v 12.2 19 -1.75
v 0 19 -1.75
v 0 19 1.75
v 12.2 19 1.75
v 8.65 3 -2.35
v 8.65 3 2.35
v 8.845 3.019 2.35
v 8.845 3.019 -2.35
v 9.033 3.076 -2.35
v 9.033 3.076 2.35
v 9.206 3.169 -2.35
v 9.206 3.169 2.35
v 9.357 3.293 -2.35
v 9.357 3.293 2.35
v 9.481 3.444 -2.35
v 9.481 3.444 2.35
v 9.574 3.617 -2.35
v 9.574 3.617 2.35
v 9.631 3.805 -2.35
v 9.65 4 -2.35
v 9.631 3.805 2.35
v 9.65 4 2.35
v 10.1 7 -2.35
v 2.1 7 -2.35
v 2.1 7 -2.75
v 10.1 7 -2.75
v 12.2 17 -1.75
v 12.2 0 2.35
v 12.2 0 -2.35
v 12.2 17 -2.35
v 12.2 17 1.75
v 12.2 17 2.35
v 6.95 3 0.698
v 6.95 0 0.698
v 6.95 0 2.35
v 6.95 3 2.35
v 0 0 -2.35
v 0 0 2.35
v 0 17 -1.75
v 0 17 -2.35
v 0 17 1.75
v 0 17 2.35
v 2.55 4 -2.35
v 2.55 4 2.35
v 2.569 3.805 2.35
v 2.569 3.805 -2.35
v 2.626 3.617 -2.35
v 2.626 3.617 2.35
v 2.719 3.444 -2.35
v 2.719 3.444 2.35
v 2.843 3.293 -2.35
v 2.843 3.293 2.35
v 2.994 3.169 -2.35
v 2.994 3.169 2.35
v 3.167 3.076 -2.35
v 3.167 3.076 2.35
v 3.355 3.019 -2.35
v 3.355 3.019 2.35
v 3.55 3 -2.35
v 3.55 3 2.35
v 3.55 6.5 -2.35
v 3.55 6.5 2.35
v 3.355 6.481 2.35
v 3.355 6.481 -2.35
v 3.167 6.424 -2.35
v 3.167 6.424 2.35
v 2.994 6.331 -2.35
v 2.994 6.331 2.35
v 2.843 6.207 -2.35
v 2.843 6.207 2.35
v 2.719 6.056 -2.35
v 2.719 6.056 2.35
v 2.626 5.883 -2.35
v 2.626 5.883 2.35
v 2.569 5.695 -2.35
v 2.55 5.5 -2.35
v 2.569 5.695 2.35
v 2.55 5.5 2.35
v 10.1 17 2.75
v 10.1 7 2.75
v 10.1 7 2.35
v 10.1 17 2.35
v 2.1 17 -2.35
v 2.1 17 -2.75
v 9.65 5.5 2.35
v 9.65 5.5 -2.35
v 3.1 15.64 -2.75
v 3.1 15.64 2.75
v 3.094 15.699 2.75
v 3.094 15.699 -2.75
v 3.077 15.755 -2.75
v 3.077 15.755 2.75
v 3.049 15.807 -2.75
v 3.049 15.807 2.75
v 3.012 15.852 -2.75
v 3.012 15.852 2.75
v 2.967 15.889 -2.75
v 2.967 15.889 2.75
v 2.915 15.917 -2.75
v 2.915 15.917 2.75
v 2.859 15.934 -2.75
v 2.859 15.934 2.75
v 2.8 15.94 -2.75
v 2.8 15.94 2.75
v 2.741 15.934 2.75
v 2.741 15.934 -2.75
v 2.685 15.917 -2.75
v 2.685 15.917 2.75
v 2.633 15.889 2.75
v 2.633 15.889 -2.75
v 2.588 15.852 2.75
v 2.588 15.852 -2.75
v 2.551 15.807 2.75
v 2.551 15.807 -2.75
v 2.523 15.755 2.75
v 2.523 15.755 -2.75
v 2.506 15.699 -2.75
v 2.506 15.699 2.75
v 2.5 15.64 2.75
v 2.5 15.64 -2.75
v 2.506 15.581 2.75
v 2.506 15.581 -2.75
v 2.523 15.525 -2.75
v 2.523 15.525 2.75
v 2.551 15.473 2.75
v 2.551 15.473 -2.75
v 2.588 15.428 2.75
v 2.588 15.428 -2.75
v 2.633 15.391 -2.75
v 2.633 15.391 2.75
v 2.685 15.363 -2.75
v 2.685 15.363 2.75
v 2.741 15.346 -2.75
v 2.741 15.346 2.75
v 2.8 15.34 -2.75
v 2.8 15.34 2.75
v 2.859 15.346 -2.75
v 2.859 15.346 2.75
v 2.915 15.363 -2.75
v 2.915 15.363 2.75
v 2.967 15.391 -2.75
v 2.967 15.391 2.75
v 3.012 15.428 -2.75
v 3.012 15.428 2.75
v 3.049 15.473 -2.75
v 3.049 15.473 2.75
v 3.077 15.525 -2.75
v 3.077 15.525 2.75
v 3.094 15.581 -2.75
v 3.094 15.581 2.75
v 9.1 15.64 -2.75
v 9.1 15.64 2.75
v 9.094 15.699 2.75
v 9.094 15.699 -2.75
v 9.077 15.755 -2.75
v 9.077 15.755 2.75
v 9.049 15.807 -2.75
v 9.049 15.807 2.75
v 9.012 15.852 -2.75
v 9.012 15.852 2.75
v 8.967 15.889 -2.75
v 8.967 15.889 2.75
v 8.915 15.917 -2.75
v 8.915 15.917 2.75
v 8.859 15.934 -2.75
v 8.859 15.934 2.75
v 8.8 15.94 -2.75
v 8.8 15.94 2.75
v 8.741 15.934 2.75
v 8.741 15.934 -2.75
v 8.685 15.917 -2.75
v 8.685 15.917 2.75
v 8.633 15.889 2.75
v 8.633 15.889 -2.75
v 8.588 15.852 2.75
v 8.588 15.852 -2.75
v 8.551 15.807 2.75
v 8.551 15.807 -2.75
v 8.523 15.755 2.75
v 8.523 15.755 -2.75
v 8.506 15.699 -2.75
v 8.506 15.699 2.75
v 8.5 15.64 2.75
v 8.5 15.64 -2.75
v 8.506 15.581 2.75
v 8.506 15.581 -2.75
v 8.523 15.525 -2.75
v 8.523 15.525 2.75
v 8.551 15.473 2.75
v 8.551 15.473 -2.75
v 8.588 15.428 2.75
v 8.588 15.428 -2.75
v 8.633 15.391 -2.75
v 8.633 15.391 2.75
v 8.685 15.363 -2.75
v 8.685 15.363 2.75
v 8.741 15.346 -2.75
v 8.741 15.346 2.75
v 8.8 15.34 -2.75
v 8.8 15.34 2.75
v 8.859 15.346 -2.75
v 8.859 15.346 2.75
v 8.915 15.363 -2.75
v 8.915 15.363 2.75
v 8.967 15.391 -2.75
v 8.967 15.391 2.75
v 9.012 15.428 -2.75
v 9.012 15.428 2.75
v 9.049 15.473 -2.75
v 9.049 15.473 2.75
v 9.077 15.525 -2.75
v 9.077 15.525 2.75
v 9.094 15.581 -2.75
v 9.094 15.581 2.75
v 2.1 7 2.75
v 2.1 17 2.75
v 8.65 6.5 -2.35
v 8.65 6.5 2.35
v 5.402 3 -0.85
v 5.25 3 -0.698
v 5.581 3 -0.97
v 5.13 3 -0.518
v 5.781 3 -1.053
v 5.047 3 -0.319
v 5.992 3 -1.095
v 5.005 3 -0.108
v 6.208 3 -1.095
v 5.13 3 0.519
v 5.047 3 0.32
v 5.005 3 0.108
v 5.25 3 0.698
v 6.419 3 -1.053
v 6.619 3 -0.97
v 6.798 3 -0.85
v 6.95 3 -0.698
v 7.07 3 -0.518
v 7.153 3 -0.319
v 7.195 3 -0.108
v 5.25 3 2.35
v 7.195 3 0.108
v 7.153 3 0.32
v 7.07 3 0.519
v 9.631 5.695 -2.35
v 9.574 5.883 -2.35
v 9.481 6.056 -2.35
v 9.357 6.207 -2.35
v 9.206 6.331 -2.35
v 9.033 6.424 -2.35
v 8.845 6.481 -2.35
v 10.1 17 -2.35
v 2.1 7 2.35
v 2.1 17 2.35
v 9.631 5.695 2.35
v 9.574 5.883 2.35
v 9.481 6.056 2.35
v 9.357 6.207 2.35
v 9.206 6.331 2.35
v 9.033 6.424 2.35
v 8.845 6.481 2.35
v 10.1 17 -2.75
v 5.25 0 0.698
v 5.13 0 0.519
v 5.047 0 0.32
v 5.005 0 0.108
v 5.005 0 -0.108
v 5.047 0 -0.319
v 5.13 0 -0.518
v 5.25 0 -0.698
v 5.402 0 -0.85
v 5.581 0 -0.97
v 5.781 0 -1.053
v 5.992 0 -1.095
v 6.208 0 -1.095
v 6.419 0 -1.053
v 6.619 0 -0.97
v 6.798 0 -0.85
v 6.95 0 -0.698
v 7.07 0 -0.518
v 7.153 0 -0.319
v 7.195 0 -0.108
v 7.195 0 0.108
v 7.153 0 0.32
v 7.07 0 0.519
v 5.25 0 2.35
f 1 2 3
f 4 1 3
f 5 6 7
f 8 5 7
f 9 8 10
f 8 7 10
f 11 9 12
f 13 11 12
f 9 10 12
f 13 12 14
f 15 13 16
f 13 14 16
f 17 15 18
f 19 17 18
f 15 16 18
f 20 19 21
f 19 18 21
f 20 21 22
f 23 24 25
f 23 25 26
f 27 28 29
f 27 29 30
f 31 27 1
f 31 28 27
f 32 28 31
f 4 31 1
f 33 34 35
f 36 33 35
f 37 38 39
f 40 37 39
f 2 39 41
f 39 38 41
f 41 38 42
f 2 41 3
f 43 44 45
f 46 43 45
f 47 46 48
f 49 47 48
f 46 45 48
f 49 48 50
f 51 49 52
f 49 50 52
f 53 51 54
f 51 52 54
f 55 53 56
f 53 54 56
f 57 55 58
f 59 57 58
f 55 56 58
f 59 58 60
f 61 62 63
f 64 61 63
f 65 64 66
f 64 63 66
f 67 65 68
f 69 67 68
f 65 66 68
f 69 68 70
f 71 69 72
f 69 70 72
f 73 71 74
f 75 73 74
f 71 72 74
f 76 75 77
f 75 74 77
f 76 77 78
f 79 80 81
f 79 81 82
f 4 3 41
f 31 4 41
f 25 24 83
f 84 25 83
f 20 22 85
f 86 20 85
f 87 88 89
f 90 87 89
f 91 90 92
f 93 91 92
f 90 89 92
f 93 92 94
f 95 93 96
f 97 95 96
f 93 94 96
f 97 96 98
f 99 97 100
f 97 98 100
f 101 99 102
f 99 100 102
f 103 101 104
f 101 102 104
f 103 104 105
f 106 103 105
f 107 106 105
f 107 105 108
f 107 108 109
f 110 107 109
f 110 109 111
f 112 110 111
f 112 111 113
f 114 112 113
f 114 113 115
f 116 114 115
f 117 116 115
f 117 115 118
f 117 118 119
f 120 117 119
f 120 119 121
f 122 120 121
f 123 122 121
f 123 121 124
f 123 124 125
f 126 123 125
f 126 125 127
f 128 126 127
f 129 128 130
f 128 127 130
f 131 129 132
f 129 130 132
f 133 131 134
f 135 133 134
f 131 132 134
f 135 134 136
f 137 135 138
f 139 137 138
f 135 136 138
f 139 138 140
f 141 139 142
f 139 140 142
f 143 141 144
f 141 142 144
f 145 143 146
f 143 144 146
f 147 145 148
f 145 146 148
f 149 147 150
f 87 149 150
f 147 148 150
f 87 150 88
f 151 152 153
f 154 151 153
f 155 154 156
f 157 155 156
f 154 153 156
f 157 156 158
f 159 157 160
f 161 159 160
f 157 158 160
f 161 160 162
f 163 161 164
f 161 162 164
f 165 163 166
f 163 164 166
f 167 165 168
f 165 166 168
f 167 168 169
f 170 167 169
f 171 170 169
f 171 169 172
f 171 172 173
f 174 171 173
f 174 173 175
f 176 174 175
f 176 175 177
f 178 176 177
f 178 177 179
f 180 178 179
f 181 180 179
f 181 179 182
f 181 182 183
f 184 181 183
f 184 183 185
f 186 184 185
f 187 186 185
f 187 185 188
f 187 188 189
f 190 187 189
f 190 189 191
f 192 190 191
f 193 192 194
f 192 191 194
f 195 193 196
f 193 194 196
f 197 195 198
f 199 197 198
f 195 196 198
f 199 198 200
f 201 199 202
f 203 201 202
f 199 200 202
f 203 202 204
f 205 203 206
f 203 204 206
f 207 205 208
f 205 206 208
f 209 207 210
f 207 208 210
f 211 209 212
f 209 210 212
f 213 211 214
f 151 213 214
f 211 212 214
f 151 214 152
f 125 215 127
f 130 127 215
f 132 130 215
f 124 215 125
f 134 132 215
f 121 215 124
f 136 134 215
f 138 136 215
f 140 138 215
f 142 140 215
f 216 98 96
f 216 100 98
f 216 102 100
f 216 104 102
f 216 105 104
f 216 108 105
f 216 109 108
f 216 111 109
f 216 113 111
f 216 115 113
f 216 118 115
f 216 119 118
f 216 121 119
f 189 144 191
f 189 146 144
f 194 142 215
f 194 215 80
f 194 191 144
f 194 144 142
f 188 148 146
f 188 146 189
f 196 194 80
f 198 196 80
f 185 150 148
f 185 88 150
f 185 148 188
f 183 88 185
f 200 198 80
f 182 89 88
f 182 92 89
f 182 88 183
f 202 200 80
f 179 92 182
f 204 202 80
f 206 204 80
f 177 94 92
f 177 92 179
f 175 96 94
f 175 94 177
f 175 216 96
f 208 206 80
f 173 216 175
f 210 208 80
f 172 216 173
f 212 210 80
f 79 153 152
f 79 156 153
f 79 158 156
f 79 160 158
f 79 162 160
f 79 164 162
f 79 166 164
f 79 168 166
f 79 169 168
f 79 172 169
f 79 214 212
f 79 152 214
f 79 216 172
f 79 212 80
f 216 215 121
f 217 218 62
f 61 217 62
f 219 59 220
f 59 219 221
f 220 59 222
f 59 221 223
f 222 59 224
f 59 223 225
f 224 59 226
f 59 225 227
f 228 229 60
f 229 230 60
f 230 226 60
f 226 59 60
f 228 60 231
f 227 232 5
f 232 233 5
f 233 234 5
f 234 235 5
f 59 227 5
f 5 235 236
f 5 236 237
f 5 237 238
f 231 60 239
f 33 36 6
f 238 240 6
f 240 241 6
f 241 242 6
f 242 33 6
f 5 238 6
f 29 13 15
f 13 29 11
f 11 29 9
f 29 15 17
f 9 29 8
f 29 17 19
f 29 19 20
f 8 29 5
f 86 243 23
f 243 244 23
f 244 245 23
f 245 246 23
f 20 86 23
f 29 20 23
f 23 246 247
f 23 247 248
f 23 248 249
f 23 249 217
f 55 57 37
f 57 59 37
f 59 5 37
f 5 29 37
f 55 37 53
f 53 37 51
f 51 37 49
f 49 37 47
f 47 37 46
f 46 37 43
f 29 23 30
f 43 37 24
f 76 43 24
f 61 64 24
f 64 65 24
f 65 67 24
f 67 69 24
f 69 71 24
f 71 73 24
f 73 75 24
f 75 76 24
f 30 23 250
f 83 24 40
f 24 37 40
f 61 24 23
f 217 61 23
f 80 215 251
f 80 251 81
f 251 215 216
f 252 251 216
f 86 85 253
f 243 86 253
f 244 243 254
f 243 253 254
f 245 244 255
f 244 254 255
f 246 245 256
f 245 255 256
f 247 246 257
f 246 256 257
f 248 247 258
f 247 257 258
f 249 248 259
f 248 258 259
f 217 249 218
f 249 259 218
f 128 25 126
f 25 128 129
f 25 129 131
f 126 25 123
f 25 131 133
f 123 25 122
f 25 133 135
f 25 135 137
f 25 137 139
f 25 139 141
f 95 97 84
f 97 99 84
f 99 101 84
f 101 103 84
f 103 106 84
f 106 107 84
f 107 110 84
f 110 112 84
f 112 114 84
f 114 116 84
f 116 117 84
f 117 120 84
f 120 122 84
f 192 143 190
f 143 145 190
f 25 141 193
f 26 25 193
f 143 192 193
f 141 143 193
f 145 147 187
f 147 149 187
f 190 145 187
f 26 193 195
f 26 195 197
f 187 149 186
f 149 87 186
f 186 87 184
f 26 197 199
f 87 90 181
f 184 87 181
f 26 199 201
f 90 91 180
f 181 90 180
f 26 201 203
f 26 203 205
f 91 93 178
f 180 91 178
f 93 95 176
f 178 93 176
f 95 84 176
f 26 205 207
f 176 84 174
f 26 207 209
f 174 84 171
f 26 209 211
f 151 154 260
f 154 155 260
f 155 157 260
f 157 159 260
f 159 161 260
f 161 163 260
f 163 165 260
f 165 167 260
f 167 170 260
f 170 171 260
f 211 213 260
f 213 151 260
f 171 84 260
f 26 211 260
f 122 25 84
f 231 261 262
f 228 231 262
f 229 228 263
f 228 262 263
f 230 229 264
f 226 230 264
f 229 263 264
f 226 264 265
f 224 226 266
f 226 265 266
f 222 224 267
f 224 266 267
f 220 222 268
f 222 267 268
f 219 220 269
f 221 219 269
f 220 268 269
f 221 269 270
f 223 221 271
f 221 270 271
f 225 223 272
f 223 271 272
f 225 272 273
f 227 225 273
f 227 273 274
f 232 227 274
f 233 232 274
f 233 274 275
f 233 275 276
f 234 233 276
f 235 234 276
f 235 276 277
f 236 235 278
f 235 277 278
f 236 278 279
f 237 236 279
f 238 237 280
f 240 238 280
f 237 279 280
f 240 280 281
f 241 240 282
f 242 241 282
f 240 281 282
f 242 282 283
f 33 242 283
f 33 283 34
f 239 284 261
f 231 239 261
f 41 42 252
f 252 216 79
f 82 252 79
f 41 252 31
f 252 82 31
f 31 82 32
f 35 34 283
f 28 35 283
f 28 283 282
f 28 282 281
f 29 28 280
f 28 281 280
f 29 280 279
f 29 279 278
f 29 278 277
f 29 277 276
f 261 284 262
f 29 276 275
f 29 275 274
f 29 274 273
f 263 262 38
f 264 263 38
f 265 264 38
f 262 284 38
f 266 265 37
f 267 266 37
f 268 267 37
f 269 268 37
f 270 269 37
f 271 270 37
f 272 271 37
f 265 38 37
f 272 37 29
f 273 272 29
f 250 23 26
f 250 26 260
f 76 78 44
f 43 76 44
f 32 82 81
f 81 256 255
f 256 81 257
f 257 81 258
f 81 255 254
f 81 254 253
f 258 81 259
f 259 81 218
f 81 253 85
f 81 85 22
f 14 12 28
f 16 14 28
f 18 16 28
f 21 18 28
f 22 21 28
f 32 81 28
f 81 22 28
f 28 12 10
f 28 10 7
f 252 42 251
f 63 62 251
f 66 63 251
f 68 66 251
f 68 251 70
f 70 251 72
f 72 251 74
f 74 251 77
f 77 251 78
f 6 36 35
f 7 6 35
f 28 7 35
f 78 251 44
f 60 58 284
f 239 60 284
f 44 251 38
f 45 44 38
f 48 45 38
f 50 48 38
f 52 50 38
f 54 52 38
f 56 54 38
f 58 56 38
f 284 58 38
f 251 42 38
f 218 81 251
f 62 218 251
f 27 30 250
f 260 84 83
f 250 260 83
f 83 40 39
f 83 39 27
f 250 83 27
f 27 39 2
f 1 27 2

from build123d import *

# Parameters (mm, degrees)
F4_DEPTH  = 12.2
F6_W      = 8
F6_H      = 10
F7_DEPTH  = 5.5
F8_R      = 0.3
F9_DEPTH  = 5.501
F11_DEPTH = 3


with BuildPart() as f4:
    # F3 (on Right) → F4 (new body)
    with BuildSketch(Plane.YZ):
        Polygon((0, 2.35), (0, 0), (0, -2.35), (17, -2.35), (17, -1.75), (19, -1.75), (19, 0), (19, 1.75), (17, 1.75), (17, 2.35), align=None)
    extrude(amount=F4_DEPTH)

    # F6 (on offset) → F7 (join)
    with BuildSketch(Plane.XY.offset(2.75)):
        with Locations((6.1, 12)):
            Rectangle(F6_W, F6_H)
    extrude(amount=-F7_DEPTH)

    # F8 (on offset) → F9 (cut, through all)
    with BuildSketch(Plane.XY.offset(2.75)):
        with BuildLine():
            ThreePointArc((2.55, 4), (2.8428932188, 3.2928932188), (3.55, 3))
            Line((3.55, 3), (8.65, 3))
            ThreePointArc((8.65, 3), (9.3571067812, 3.2928932188), (9.65, 4))
            Line((9.65, 4), (9.65, 5.5))
            ThreePointArc((9.65, 5.5), (9.3571067812, 6.2071067812), (8.65, 6.5))
            Line((8.65, 6.5), (3.55, 6.5))
            ThreePointArc((3.55, 6.5), (2.8428932188, 6.2071067812), (2.55, 5.5))
            Line((2.55, 5.5), (2.55, 4))
        make_face()
        with Locations((2.8, 15.64)):
            Circle(F8_R)
        with Locations((8.8, 15.64)):
            Circle(F8_R)
    extrude(amount=-F9_DEPTH, mode=Mode.SUBTRACT)

    # F10 (on face) → F11 (cut, through all)
    with BuildSketch(Plane.XZ):
        with BuildLine():
            Line((6.95, 2.35), (5.25, 2.35))
            Line((5.25, 2.35), (5.25, 0.6982120022))
            ThreePointArc((5.25, 0.6982120022), (6.1, -1.1), (6.95, 0.6982120022))
            Line((6.95, 0.6982120022), (6.95, 2.35))
        make_face()
    extrude(amount=-F11_DEPTH, mode=Mode.SUBTRACT)


solid = f4.part
